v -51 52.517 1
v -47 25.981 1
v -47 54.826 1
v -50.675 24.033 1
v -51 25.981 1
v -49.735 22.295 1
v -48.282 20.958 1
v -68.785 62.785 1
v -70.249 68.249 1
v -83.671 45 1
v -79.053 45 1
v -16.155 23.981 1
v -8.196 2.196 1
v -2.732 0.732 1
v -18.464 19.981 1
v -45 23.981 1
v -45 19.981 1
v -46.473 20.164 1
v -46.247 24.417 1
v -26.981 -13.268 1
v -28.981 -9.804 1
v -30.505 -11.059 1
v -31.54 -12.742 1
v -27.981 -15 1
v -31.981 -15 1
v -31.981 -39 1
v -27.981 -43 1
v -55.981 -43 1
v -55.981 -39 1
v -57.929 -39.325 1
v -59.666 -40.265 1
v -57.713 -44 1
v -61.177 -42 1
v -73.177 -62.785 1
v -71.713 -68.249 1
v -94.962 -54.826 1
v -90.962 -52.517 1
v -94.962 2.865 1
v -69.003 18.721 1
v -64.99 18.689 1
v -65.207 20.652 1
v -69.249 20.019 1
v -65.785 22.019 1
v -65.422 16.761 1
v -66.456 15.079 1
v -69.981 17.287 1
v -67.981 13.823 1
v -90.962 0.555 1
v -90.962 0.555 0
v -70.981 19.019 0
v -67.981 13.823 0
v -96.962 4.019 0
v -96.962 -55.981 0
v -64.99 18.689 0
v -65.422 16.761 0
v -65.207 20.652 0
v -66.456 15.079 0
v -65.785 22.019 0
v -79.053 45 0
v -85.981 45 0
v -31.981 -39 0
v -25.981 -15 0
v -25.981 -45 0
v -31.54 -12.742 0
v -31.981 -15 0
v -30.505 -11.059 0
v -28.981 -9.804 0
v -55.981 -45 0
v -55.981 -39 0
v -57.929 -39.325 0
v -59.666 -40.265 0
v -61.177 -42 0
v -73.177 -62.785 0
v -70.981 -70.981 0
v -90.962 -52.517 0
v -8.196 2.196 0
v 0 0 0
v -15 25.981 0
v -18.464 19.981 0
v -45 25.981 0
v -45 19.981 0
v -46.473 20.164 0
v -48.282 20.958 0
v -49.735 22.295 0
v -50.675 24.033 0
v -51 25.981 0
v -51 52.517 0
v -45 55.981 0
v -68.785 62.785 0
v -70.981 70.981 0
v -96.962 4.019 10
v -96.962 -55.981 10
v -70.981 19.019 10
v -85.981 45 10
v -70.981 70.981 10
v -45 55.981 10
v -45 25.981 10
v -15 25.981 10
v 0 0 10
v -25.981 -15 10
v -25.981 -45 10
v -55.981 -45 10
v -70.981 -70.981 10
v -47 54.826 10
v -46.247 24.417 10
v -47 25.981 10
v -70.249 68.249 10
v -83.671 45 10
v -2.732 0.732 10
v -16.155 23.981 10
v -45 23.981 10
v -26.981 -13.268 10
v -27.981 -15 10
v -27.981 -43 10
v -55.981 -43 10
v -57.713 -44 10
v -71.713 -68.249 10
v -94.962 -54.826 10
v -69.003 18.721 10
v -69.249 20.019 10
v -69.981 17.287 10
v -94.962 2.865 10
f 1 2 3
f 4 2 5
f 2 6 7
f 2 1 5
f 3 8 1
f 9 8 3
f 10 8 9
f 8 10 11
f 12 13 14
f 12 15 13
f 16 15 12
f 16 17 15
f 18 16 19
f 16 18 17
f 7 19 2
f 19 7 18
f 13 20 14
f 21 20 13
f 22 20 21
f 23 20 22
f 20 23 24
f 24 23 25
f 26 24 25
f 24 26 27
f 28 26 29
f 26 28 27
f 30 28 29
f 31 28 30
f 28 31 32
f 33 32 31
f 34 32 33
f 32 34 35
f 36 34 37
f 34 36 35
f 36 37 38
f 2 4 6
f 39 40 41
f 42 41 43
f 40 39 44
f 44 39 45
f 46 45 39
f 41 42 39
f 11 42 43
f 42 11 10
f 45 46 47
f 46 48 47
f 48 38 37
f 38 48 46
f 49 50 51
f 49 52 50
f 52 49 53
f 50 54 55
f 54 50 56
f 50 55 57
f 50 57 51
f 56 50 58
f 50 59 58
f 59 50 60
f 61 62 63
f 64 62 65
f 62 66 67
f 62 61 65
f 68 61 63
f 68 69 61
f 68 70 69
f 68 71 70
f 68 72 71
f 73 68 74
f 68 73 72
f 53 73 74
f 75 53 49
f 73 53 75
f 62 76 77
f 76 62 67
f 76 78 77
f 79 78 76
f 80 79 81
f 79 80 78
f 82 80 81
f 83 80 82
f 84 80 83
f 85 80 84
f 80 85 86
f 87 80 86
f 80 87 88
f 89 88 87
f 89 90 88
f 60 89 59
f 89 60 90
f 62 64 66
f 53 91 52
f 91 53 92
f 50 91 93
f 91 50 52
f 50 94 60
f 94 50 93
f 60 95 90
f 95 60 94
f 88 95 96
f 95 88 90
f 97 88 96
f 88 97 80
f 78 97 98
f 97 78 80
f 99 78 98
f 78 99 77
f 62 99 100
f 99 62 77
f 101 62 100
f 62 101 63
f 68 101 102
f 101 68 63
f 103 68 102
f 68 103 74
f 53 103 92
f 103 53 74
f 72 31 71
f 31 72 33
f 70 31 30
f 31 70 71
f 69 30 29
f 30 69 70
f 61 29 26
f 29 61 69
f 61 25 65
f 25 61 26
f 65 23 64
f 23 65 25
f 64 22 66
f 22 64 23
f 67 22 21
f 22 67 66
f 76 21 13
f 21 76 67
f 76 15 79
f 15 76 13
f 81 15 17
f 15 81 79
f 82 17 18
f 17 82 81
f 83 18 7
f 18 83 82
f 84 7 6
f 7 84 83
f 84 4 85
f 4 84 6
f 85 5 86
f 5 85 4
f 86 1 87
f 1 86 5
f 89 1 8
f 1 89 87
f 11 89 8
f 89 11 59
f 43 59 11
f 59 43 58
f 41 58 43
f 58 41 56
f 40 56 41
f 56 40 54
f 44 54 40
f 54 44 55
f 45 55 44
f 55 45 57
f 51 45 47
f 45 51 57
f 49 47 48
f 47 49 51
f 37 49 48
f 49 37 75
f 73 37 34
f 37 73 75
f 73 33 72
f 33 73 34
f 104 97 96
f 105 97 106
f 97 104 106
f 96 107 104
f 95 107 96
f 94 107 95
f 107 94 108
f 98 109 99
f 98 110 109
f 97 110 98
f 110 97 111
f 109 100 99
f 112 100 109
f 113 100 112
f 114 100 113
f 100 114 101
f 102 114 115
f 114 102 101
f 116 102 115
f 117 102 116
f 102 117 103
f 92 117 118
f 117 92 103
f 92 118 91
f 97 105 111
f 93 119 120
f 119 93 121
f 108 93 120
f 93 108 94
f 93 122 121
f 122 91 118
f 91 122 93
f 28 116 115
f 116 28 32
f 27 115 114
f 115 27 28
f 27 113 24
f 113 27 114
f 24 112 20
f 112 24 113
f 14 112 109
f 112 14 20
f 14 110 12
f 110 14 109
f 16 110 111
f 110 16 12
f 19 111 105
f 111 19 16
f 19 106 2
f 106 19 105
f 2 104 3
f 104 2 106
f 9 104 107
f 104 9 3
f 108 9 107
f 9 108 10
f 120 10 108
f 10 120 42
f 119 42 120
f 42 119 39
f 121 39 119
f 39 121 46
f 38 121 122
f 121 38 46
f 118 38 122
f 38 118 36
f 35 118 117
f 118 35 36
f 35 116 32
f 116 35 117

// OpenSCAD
a = 1;
b = 1;

// Wiggliness
curve_amount = 0; // [0:flat, 3: curvy]

c = cos(60);
s = sin(60);

num_steps = 20;

moves = [
    [0,0],
    [c*b, s*b],
    [b,0],
    [0,a],
    [s*a, c*a],
    [c*b, -s*b],
    [-c*b, -s*b],
    [s*a, -c*a],
    [0, -a],
    [0, -a],
    [-s*a, -c*a],
    [-c*b, s*b],
    [-b, 0],
    [0, a],
    [-s*a, c*a]
];
    
points = [ 
    for (
        i=0, p=moves[0]; 
        i < len(moves)-1; 
        i = i+1, p = p + moves[i]
    )
    p*30
];
    
function curve_between(a, b, steps=num_steps, curve=curve_amount) = 
    let(
        d = b-a,
        n = [d[1],-d[0]]/norm(d)
    )
    [ for (i=0,t=0; i<steps; i = i+1, t=i/steps) t*b + (1-t)*a + n*sin(-360*t)*curve ]
;

curve_points = [ for(i=0;i<len(points);i=i+1) each curve_between(points[i], points[(i+1) % len(points)]) ];

module tile() {
    polygon(curve_points);
}
 
module outline(thickness) {
    if(thickness > 0) {
        difference() {
            offset(thickness) children();
            children();
        }
    } else {
        difference() {
            children();
            offset(thickness) children();
        }
    }
}

module cookie_cutter(height, thickness, handle) {
    translate([0,0,height]) rotate([0,180,0]) {
        linear_extrude(height) outline(-thickness) children();
        translate([0,0,height-1]) difference() {
            union() {
//                linear_extrude(1) outline(handle) children();
                linear_extrude(1) outline(-handle) children();
            }
            for (p = points) {
           //     translate(p*30) cylinder(d=1.5*handle, $fn=20);
            }
        }
        //handle_end(height,handle) children();
    }
}

module handle_end(height,handle) {
    intersection() {
      length = (points[2][1] - points[11][1]);
      #union() {
        translate(points[2] - [13,3*handle,0]) cube([2*handle,4*handle,height]);
        translate([points[2][0],points[11][1],0] - [13,0*handle,0]) cube([2*handle,2*handle,height]);
      }
      linear_extrude(1) outline(-handle) children();
    }
}

cookie_cutter(height=10, thickness=2, handle=6) tile();
